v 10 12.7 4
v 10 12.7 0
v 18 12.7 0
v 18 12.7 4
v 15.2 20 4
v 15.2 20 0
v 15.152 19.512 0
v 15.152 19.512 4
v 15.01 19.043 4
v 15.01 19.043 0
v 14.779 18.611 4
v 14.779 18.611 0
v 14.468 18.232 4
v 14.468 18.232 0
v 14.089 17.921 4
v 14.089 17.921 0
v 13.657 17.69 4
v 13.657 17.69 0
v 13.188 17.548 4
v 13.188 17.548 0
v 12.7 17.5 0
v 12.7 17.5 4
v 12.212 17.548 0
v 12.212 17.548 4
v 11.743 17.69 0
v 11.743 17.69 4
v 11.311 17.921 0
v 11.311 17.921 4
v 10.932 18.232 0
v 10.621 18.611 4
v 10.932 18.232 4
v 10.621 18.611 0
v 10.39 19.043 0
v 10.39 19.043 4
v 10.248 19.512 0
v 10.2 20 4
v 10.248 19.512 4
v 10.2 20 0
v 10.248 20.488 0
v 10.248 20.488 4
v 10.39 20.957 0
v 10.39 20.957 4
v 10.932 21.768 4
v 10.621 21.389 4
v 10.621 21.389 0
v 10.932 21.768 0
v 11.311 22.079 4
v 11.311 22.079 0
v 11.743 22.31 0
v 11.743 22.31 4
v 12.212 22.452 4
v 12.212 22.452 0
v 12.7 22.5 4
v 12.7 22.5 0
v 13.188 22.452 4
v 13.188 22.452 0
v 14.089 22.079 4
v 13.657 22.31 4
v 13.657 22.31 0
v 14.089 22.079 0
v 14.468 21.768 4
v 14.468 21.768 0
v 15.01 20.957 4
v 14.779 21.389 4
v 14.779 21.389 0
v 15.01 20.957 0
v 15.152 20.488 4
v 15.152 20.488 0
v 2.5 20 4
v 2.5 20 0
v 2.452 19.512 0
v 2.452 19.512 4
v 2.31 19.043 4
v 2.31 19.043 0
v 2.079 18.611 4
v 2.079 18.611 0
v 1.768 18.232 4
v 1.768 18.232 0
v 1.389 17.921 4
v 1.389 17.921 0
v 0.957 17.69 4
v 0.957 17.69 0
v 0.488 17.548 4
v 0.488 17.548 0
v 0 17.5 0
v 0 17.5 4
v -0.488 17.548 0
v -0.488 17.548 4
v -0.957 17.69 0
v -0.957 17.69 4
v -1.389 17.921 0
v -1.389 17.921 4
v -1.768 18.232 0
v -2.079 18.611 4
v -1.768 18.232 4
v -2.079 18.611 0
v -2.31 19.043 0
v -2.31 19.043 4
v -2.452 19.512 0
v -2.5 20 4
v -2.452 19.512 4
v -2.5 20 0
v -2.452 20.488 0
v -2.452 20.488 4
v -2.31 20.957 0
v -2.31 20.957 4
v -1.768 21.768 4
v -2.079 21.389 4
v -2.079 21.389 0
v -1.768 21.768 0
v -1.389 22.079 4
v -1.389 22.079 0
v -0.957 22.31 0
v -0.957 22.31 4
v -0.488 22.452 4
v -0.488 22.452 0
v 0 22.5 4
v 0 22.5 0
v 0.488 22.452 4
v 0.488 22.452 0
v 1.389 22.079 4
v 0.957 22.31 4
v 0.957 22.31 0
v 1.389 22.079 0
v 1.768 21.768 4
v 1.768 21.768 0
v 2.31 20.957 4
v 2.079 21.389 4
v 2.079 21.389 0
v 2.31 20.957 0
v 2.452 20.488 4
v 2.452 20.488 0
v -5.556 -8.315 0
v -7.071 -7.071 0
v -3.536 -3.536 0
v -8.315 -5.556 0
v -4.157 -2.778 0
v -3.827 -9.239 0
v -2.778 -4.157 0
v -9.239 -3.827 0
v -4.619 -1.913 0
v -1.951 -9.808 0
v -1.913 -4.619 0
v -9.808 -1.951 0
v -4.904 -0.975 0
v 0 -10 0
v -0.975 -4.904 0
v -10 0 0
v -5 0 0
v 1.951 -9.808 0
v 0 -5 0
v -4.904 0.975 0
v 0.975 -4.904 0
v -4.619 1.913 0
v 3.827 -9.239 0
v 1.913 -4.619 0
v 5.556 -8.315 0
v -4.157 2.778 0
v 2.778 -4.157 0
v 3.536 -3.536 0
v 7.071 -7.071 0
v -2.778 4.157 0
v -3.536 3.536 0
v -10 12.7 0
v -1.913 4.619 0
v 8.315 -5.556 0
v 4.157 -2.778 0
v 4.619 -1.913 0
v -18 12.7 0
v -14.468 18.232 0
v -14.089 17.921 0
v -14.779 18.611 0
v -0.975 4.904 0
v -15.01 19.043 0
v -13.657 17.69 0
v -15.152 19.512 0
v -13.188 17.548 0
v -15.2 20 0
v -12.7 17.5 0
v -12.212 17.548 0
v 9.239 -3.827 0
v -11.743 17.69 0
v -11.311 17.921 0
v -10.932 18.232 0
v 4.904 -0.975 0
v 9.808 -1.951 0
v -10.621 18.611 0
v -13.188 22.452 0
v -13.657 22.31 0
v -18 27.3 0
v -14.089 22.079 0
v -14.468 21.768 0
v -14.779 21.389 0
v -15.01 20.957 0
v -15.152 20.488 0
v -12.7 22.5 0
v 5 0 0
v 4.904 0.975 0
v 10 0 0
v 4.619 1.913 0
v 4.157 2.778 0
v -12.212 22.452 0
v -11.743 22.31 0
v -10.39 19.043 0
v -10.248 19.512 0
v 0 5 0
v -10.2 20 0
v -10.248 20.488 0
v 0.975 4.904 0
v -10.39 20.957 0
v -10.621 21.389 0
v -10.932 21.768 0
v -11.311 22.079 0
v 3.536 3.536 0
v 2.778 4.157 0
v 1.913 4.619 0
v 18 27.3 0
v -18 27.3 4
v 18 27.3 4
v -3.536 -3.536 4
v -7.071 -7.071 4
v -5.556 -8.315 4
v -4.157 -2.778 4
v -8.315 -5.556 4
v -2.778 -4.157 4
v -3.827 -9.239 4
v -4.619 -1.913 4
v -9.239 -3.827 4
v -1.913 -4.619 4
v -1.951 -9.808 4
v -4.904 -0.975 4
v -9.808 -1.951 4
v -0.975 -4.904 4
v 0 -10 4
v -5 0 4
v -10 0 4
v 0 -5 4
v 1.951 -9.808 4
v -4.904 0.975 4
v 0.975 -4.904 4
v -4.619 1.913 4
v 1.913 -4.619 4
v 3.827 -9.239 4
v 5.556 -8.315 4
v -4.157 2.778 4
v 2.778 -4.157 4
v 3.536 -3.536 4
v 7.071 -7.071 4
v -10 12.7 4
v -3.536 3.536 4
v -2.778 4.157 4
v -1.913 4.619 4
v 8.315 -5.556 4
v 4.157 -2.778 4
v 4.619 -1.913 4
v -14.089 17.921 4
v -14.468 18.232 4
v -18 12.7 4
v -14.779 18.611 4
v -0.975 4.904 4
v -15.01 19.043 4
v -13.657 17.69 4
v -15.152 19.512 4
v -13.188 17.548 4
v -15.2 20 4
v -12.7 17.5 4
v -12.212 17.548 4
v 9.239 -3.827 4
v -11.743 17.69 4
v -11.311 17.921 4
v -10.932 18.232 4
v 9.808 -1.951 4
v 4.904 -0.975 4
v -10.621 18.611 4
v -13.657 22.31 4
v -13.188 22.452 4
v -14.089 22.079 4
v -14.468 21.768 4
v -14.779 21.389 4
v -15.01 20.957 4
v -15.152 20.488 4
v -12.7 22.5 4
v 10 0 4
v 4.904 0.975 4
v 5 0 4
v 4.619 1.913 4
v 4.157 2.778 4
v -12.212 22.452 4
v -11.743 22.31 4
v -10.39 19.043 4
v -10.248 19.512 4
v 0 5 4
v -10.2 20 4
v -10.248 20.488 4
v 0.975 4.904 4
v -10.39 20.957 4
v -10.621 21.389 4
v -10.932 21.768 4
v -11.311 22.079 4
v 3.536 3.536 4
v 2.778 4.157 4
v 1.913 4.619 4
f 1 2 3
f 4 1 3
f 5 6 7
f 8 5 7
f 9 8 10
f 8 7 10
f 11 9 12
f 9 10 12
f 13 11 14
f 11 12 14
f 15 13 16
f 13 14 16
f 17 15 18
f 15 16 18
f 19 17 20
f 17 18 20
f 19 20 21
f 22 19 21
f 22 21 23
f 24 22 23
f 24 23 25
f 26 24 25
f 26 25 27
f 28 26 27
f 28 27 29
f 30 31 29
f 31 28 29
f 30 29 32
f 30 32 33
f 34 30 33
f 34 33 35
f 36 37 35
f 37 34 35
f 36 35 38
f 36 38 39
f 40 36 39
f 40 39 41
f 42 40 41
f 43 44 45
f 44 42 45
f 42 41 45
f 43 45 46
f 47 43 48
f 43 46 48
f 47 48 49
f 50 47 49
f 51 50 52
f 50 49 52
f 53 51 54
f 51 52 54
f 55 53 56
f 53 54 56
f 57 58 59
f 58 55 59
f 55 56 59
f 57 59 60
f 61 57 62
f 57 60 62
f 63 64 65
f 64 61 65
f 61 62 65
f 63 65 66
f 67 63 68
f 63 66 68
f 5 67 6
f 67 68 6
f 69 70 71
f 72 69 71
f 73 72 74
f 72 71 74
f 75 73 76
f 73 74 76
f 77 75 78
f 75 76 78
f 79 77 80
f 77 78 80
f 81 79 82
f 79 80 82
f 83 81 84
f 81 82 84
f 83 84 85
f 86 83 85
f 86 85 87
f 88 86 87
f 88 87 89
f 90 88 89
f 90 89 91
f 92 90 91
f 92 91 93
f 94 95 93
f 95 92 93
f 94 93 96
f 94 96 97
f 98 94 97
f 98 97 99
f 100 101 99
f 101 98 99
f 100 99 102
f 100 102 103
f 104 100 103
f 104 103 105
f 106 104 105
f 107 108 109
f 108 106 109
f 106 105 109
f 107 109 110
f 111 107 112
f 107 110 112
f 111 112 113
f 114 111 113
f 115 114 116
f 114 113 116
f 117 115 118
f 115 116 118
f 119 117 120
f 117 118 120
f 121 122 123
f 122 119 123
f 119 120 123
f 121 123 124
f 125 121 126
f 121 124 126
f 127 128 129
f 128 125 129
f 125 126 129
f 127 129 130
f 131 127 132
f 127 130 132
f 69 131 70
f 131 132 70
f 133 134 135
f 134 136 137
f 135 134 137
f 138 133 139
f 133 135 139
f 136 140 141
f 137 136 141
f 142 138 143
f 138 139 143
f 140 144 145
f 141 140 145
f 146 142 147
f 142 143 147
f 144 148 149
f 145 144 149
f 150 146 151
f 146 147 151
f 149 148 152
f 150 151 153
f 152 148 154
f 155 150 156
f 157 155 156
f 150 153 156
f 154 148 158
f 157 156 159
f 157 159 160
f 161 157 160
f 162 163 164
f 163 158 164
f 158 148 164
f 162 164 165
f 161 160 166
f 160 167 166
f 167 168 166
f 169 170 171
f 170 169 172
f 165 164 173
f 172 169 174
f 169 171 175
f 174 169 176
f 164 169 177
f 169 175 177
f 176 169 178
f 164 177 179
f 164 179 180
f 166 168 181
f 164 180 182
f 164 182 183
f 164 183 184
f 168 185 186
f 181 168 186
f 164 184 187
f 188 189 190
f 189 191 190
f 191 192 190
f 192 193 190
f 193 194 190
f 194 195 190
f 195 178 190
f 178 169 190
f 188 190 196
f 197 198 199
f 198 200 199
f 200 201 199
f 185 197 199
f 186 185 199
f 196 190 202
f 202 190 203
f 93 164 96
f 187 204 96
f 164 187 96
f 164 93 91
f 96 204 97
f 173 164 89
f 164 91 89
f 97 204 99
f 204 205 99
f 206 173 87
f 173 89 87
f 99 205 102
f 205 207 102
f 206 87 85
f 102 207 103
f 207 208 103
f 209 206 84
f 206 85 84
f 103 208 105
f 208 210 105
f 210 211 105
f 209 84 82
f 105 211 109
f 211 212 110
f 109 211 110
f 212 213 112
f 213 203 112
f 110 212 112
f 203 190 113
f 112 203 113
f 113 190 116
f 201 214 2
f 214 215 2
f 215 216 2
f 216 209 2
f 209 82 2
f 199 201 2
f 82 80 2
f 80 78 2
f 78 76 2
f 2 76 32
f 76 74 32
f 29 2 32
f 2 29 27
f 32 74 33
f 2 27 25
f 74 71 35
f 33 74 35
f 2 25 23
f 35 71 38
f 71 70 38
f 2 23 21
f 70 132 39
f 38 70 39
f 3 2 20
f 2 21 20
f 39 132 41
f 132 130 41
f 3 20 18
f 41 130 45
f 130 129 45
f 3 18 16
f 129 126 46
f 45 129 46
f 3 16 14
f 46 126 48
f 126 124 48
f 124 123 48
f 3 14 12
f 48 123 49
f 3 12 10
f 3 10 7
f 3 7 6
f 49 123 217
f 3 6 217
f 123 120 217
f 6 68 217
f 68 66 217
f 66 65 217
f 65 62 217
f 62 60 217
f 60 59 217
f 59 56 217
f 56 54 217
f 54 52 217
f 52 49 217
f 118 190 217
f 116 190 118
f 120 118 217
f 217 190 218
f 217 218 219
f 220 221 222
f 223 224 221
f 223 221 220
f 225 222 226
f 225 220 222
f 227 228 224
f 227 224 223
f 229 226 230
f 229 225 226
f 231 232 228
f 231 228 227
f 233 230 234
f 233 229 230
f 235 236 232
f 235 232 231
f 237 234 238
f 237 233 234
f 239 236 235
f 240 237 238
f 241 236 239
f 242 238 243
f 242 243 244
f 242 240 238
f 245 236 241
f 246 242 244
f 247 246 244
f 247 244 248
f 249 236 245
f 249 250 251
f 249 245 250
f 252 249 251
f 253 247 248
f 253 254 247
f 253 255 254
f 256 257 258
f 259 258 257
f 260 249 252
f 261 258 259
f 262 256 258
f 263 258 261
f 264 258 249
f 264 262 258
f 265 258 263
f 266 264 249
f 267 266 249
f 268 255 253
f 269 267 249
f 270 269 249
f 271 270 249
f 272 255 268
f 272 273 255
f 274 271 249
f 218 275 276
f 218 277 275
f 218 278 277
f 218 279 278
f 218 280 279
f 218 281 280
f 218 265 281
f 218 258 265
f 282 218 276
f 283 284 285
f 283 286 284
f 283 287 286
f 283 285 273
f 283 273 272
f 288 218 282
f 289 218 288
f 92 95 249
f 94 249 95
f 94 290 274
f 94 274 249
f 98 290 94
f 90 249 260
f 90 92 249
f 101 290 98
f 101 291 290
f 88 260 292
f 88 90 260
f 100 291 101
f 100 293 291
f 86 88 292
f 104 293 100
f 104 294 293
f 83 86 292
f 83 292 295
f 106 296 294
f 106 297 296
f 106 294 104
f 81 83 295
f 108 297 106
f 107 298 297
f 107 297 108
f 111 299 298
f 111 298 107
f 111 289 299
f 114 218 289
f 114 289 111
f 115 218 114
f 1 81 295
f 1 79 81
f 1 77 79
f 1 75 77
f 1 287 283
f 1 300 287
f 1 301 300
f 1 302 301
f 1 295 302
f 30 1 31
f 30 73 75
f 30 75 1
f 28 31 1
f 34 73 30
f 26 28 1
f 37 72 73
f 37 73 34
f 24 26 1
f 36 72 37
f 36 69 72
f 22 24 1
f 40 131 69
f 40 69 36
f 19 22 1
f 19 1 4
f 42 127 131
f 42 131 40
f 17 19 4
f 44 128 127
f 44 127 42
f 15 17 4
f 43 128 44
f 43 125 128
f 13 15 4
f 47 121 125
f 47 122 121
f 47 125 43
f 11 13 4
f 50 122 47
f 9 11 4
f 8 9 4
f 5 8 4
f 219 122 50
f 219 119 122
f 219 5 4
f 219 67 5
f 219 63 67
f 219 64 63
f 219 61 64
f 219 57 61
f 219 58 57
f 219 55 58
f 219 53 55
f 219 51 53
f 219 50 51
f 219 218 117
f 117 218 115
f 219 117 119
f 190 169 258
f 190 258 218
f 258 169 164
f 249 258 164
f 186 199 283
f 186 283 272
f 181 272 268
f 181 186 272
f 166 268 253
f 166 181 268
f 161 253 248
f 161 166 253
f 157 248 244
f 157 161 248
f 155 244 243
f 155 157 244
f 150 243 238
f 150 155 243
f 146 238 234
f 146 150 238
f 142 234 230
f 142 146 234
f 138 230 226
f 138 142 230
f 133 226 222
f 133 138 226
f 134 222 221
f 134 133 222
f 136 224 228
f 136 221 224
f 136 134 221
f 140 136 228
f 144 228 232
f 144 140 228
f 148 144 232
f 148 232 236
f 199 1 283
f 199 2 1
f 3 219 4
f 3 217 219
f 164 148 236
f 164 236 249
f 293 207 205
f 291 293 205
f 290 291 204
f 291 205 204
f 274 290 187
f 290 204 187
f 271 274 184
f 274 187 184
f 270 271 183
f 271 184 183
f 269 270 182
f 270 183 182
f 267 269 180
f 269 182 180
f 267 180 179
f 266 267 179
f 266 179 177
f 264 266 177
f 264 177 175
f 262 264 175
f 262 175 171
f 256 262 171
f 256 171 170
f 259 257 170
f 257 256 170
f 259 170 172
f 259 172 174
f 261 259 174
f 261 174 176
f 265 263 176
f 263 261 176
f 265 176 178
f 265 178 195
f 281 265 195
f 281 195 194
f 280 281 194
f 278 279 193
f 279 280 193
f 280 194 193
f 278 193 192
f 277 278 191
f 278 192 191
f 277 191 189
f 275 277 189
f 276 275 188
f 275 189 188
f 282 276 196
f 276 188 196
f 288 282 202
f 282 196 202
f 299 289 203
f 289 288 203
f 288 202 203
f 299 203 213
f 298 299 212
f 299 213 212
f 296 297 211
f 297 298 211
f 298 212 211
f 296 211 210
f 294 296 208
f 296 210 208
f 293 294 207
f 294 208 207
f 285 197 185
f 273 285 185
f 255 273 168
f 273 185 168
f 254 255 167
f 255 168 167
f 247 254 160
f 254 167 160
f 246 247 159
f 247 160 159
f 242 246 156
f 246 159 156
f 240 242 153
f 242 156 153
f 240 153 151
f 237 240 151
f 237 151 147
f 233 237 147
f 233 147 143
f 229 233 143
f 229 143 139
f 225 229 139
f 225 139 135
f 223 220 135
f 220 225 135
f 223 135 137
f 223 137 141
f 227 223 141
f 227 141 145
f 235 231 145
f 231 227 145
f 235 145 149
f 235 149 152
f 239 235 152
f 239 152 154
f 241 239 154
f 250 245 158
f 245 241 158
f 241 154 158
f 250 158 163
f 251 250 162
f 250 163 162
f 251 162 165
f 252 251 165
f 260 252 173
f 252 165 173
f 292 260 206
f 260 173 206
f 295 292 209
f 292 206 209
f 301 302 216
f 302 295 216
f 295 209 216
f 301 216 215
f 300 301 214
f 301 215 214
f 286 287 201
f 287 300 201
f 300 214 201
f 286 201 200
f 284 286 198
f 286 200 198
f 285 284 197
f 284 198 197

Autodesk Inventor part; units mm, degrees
ref_plane "YZ Plane" through (0, 0, 0) normal (1, 0, 0) x (0, 1, 0)
ref_plane "XZ Plane" through (0, 0, 0) normal (0, 1, 0) x (-1, 0, 0)
ref_plane "XY Plane" through (0, 0, 0) normal (0, 0, 1) x (1, 0, 0)
sketch "Esboço1" plane through (0, 0, 0) normal (0, 0, 1) x (1, 0, 0)
  circle A0 centre (0, 0) radius 5
  line L0 (0, 0) -> (0, 22.7) construction
  line L1 (-10, 0) -> (-10, 22.7)
  line L2 (10, 22.7) -> (10, 0)
  arc A1 (-10, 0) -> (10, 0) centre (0, 0) ccw
  arc A2 (10, 22.7) -> (-10, 22.7) centre (0, 22.7) ccw
  line L3 (-25.4, 12.7) -> (25.4, 12.7)
  line L4 (25.4, 12.7) -> (25.4, 32.7)
  line L5 (25.4, 32.7) -> (-25.4, 32.7)
  line L6 (-25.4, 32.7) -> (-25.4, 12.7)
  line L7 (-25.4, 12.7) -> (25.4, 32.7) construction
  line L8 (25.4, 12.7) -> (-25.4, 32.7) construction
  circle A3 centre (0, 20) radius 2.5
  line L9 (25.4, 12.7) -> (-25.4, 12.7)
  line L10 (-25.4, 12.7) -> (-25.4, 27.3)
  line L11 (-25.4, 27.3) -> (25.4, 27.3)
  line L12 (25.4, 27.3) -> (25.4, 12.7)
  line L13 (25.4, 12.7) -> (-25.4, 27.3) construction
  line L14 (-25.4, 12.7) -> (25.4, 27.3) construction
  circle A4 centre (12.7, 20) radius 2.5
  circle A5 centre (-12.7, 20) radius 2.5
  line L15 (18, 12.7) -> (-18, 12.7)
  line L16 (-18, 12.7) -> (-18, 27.3)
  line L17 (-18, 27.3) -> (18, 27.3)
  line L18 (18, 27.3) -> (18, 12.7)
  line L19 (18, 12.7) -> (-18, 27.3) construction
  line L20 (-18, 12.7) -> (18, 27.3) construction
  point P0 (0, 11.35)
  point P1 (25.4, 22.7)
  point P2 (-10, 12.7)
  point P3 (10, 12.7)
  dimension "d0" = 10
  dimension "d1" = 5
  dimension "d2" = 25.4
  dimension "d3" = 5
  dimension "d4" = 12.7
  dimension "d5" = 7.3
  dimension "d6" = 20
  dimension "d9" = 12.7
  dimension "d14" = 18
extrude "Extrusão1" add sketch "Esboço1" along normal blind 4 contours L1 L3 L2 A1 | L3 L16 L11 A2 L1 | L1 A2 L11 L2 L3 | L2 A2 L11 L18 L3
properties part number "Suporte Coletor - Intake"
